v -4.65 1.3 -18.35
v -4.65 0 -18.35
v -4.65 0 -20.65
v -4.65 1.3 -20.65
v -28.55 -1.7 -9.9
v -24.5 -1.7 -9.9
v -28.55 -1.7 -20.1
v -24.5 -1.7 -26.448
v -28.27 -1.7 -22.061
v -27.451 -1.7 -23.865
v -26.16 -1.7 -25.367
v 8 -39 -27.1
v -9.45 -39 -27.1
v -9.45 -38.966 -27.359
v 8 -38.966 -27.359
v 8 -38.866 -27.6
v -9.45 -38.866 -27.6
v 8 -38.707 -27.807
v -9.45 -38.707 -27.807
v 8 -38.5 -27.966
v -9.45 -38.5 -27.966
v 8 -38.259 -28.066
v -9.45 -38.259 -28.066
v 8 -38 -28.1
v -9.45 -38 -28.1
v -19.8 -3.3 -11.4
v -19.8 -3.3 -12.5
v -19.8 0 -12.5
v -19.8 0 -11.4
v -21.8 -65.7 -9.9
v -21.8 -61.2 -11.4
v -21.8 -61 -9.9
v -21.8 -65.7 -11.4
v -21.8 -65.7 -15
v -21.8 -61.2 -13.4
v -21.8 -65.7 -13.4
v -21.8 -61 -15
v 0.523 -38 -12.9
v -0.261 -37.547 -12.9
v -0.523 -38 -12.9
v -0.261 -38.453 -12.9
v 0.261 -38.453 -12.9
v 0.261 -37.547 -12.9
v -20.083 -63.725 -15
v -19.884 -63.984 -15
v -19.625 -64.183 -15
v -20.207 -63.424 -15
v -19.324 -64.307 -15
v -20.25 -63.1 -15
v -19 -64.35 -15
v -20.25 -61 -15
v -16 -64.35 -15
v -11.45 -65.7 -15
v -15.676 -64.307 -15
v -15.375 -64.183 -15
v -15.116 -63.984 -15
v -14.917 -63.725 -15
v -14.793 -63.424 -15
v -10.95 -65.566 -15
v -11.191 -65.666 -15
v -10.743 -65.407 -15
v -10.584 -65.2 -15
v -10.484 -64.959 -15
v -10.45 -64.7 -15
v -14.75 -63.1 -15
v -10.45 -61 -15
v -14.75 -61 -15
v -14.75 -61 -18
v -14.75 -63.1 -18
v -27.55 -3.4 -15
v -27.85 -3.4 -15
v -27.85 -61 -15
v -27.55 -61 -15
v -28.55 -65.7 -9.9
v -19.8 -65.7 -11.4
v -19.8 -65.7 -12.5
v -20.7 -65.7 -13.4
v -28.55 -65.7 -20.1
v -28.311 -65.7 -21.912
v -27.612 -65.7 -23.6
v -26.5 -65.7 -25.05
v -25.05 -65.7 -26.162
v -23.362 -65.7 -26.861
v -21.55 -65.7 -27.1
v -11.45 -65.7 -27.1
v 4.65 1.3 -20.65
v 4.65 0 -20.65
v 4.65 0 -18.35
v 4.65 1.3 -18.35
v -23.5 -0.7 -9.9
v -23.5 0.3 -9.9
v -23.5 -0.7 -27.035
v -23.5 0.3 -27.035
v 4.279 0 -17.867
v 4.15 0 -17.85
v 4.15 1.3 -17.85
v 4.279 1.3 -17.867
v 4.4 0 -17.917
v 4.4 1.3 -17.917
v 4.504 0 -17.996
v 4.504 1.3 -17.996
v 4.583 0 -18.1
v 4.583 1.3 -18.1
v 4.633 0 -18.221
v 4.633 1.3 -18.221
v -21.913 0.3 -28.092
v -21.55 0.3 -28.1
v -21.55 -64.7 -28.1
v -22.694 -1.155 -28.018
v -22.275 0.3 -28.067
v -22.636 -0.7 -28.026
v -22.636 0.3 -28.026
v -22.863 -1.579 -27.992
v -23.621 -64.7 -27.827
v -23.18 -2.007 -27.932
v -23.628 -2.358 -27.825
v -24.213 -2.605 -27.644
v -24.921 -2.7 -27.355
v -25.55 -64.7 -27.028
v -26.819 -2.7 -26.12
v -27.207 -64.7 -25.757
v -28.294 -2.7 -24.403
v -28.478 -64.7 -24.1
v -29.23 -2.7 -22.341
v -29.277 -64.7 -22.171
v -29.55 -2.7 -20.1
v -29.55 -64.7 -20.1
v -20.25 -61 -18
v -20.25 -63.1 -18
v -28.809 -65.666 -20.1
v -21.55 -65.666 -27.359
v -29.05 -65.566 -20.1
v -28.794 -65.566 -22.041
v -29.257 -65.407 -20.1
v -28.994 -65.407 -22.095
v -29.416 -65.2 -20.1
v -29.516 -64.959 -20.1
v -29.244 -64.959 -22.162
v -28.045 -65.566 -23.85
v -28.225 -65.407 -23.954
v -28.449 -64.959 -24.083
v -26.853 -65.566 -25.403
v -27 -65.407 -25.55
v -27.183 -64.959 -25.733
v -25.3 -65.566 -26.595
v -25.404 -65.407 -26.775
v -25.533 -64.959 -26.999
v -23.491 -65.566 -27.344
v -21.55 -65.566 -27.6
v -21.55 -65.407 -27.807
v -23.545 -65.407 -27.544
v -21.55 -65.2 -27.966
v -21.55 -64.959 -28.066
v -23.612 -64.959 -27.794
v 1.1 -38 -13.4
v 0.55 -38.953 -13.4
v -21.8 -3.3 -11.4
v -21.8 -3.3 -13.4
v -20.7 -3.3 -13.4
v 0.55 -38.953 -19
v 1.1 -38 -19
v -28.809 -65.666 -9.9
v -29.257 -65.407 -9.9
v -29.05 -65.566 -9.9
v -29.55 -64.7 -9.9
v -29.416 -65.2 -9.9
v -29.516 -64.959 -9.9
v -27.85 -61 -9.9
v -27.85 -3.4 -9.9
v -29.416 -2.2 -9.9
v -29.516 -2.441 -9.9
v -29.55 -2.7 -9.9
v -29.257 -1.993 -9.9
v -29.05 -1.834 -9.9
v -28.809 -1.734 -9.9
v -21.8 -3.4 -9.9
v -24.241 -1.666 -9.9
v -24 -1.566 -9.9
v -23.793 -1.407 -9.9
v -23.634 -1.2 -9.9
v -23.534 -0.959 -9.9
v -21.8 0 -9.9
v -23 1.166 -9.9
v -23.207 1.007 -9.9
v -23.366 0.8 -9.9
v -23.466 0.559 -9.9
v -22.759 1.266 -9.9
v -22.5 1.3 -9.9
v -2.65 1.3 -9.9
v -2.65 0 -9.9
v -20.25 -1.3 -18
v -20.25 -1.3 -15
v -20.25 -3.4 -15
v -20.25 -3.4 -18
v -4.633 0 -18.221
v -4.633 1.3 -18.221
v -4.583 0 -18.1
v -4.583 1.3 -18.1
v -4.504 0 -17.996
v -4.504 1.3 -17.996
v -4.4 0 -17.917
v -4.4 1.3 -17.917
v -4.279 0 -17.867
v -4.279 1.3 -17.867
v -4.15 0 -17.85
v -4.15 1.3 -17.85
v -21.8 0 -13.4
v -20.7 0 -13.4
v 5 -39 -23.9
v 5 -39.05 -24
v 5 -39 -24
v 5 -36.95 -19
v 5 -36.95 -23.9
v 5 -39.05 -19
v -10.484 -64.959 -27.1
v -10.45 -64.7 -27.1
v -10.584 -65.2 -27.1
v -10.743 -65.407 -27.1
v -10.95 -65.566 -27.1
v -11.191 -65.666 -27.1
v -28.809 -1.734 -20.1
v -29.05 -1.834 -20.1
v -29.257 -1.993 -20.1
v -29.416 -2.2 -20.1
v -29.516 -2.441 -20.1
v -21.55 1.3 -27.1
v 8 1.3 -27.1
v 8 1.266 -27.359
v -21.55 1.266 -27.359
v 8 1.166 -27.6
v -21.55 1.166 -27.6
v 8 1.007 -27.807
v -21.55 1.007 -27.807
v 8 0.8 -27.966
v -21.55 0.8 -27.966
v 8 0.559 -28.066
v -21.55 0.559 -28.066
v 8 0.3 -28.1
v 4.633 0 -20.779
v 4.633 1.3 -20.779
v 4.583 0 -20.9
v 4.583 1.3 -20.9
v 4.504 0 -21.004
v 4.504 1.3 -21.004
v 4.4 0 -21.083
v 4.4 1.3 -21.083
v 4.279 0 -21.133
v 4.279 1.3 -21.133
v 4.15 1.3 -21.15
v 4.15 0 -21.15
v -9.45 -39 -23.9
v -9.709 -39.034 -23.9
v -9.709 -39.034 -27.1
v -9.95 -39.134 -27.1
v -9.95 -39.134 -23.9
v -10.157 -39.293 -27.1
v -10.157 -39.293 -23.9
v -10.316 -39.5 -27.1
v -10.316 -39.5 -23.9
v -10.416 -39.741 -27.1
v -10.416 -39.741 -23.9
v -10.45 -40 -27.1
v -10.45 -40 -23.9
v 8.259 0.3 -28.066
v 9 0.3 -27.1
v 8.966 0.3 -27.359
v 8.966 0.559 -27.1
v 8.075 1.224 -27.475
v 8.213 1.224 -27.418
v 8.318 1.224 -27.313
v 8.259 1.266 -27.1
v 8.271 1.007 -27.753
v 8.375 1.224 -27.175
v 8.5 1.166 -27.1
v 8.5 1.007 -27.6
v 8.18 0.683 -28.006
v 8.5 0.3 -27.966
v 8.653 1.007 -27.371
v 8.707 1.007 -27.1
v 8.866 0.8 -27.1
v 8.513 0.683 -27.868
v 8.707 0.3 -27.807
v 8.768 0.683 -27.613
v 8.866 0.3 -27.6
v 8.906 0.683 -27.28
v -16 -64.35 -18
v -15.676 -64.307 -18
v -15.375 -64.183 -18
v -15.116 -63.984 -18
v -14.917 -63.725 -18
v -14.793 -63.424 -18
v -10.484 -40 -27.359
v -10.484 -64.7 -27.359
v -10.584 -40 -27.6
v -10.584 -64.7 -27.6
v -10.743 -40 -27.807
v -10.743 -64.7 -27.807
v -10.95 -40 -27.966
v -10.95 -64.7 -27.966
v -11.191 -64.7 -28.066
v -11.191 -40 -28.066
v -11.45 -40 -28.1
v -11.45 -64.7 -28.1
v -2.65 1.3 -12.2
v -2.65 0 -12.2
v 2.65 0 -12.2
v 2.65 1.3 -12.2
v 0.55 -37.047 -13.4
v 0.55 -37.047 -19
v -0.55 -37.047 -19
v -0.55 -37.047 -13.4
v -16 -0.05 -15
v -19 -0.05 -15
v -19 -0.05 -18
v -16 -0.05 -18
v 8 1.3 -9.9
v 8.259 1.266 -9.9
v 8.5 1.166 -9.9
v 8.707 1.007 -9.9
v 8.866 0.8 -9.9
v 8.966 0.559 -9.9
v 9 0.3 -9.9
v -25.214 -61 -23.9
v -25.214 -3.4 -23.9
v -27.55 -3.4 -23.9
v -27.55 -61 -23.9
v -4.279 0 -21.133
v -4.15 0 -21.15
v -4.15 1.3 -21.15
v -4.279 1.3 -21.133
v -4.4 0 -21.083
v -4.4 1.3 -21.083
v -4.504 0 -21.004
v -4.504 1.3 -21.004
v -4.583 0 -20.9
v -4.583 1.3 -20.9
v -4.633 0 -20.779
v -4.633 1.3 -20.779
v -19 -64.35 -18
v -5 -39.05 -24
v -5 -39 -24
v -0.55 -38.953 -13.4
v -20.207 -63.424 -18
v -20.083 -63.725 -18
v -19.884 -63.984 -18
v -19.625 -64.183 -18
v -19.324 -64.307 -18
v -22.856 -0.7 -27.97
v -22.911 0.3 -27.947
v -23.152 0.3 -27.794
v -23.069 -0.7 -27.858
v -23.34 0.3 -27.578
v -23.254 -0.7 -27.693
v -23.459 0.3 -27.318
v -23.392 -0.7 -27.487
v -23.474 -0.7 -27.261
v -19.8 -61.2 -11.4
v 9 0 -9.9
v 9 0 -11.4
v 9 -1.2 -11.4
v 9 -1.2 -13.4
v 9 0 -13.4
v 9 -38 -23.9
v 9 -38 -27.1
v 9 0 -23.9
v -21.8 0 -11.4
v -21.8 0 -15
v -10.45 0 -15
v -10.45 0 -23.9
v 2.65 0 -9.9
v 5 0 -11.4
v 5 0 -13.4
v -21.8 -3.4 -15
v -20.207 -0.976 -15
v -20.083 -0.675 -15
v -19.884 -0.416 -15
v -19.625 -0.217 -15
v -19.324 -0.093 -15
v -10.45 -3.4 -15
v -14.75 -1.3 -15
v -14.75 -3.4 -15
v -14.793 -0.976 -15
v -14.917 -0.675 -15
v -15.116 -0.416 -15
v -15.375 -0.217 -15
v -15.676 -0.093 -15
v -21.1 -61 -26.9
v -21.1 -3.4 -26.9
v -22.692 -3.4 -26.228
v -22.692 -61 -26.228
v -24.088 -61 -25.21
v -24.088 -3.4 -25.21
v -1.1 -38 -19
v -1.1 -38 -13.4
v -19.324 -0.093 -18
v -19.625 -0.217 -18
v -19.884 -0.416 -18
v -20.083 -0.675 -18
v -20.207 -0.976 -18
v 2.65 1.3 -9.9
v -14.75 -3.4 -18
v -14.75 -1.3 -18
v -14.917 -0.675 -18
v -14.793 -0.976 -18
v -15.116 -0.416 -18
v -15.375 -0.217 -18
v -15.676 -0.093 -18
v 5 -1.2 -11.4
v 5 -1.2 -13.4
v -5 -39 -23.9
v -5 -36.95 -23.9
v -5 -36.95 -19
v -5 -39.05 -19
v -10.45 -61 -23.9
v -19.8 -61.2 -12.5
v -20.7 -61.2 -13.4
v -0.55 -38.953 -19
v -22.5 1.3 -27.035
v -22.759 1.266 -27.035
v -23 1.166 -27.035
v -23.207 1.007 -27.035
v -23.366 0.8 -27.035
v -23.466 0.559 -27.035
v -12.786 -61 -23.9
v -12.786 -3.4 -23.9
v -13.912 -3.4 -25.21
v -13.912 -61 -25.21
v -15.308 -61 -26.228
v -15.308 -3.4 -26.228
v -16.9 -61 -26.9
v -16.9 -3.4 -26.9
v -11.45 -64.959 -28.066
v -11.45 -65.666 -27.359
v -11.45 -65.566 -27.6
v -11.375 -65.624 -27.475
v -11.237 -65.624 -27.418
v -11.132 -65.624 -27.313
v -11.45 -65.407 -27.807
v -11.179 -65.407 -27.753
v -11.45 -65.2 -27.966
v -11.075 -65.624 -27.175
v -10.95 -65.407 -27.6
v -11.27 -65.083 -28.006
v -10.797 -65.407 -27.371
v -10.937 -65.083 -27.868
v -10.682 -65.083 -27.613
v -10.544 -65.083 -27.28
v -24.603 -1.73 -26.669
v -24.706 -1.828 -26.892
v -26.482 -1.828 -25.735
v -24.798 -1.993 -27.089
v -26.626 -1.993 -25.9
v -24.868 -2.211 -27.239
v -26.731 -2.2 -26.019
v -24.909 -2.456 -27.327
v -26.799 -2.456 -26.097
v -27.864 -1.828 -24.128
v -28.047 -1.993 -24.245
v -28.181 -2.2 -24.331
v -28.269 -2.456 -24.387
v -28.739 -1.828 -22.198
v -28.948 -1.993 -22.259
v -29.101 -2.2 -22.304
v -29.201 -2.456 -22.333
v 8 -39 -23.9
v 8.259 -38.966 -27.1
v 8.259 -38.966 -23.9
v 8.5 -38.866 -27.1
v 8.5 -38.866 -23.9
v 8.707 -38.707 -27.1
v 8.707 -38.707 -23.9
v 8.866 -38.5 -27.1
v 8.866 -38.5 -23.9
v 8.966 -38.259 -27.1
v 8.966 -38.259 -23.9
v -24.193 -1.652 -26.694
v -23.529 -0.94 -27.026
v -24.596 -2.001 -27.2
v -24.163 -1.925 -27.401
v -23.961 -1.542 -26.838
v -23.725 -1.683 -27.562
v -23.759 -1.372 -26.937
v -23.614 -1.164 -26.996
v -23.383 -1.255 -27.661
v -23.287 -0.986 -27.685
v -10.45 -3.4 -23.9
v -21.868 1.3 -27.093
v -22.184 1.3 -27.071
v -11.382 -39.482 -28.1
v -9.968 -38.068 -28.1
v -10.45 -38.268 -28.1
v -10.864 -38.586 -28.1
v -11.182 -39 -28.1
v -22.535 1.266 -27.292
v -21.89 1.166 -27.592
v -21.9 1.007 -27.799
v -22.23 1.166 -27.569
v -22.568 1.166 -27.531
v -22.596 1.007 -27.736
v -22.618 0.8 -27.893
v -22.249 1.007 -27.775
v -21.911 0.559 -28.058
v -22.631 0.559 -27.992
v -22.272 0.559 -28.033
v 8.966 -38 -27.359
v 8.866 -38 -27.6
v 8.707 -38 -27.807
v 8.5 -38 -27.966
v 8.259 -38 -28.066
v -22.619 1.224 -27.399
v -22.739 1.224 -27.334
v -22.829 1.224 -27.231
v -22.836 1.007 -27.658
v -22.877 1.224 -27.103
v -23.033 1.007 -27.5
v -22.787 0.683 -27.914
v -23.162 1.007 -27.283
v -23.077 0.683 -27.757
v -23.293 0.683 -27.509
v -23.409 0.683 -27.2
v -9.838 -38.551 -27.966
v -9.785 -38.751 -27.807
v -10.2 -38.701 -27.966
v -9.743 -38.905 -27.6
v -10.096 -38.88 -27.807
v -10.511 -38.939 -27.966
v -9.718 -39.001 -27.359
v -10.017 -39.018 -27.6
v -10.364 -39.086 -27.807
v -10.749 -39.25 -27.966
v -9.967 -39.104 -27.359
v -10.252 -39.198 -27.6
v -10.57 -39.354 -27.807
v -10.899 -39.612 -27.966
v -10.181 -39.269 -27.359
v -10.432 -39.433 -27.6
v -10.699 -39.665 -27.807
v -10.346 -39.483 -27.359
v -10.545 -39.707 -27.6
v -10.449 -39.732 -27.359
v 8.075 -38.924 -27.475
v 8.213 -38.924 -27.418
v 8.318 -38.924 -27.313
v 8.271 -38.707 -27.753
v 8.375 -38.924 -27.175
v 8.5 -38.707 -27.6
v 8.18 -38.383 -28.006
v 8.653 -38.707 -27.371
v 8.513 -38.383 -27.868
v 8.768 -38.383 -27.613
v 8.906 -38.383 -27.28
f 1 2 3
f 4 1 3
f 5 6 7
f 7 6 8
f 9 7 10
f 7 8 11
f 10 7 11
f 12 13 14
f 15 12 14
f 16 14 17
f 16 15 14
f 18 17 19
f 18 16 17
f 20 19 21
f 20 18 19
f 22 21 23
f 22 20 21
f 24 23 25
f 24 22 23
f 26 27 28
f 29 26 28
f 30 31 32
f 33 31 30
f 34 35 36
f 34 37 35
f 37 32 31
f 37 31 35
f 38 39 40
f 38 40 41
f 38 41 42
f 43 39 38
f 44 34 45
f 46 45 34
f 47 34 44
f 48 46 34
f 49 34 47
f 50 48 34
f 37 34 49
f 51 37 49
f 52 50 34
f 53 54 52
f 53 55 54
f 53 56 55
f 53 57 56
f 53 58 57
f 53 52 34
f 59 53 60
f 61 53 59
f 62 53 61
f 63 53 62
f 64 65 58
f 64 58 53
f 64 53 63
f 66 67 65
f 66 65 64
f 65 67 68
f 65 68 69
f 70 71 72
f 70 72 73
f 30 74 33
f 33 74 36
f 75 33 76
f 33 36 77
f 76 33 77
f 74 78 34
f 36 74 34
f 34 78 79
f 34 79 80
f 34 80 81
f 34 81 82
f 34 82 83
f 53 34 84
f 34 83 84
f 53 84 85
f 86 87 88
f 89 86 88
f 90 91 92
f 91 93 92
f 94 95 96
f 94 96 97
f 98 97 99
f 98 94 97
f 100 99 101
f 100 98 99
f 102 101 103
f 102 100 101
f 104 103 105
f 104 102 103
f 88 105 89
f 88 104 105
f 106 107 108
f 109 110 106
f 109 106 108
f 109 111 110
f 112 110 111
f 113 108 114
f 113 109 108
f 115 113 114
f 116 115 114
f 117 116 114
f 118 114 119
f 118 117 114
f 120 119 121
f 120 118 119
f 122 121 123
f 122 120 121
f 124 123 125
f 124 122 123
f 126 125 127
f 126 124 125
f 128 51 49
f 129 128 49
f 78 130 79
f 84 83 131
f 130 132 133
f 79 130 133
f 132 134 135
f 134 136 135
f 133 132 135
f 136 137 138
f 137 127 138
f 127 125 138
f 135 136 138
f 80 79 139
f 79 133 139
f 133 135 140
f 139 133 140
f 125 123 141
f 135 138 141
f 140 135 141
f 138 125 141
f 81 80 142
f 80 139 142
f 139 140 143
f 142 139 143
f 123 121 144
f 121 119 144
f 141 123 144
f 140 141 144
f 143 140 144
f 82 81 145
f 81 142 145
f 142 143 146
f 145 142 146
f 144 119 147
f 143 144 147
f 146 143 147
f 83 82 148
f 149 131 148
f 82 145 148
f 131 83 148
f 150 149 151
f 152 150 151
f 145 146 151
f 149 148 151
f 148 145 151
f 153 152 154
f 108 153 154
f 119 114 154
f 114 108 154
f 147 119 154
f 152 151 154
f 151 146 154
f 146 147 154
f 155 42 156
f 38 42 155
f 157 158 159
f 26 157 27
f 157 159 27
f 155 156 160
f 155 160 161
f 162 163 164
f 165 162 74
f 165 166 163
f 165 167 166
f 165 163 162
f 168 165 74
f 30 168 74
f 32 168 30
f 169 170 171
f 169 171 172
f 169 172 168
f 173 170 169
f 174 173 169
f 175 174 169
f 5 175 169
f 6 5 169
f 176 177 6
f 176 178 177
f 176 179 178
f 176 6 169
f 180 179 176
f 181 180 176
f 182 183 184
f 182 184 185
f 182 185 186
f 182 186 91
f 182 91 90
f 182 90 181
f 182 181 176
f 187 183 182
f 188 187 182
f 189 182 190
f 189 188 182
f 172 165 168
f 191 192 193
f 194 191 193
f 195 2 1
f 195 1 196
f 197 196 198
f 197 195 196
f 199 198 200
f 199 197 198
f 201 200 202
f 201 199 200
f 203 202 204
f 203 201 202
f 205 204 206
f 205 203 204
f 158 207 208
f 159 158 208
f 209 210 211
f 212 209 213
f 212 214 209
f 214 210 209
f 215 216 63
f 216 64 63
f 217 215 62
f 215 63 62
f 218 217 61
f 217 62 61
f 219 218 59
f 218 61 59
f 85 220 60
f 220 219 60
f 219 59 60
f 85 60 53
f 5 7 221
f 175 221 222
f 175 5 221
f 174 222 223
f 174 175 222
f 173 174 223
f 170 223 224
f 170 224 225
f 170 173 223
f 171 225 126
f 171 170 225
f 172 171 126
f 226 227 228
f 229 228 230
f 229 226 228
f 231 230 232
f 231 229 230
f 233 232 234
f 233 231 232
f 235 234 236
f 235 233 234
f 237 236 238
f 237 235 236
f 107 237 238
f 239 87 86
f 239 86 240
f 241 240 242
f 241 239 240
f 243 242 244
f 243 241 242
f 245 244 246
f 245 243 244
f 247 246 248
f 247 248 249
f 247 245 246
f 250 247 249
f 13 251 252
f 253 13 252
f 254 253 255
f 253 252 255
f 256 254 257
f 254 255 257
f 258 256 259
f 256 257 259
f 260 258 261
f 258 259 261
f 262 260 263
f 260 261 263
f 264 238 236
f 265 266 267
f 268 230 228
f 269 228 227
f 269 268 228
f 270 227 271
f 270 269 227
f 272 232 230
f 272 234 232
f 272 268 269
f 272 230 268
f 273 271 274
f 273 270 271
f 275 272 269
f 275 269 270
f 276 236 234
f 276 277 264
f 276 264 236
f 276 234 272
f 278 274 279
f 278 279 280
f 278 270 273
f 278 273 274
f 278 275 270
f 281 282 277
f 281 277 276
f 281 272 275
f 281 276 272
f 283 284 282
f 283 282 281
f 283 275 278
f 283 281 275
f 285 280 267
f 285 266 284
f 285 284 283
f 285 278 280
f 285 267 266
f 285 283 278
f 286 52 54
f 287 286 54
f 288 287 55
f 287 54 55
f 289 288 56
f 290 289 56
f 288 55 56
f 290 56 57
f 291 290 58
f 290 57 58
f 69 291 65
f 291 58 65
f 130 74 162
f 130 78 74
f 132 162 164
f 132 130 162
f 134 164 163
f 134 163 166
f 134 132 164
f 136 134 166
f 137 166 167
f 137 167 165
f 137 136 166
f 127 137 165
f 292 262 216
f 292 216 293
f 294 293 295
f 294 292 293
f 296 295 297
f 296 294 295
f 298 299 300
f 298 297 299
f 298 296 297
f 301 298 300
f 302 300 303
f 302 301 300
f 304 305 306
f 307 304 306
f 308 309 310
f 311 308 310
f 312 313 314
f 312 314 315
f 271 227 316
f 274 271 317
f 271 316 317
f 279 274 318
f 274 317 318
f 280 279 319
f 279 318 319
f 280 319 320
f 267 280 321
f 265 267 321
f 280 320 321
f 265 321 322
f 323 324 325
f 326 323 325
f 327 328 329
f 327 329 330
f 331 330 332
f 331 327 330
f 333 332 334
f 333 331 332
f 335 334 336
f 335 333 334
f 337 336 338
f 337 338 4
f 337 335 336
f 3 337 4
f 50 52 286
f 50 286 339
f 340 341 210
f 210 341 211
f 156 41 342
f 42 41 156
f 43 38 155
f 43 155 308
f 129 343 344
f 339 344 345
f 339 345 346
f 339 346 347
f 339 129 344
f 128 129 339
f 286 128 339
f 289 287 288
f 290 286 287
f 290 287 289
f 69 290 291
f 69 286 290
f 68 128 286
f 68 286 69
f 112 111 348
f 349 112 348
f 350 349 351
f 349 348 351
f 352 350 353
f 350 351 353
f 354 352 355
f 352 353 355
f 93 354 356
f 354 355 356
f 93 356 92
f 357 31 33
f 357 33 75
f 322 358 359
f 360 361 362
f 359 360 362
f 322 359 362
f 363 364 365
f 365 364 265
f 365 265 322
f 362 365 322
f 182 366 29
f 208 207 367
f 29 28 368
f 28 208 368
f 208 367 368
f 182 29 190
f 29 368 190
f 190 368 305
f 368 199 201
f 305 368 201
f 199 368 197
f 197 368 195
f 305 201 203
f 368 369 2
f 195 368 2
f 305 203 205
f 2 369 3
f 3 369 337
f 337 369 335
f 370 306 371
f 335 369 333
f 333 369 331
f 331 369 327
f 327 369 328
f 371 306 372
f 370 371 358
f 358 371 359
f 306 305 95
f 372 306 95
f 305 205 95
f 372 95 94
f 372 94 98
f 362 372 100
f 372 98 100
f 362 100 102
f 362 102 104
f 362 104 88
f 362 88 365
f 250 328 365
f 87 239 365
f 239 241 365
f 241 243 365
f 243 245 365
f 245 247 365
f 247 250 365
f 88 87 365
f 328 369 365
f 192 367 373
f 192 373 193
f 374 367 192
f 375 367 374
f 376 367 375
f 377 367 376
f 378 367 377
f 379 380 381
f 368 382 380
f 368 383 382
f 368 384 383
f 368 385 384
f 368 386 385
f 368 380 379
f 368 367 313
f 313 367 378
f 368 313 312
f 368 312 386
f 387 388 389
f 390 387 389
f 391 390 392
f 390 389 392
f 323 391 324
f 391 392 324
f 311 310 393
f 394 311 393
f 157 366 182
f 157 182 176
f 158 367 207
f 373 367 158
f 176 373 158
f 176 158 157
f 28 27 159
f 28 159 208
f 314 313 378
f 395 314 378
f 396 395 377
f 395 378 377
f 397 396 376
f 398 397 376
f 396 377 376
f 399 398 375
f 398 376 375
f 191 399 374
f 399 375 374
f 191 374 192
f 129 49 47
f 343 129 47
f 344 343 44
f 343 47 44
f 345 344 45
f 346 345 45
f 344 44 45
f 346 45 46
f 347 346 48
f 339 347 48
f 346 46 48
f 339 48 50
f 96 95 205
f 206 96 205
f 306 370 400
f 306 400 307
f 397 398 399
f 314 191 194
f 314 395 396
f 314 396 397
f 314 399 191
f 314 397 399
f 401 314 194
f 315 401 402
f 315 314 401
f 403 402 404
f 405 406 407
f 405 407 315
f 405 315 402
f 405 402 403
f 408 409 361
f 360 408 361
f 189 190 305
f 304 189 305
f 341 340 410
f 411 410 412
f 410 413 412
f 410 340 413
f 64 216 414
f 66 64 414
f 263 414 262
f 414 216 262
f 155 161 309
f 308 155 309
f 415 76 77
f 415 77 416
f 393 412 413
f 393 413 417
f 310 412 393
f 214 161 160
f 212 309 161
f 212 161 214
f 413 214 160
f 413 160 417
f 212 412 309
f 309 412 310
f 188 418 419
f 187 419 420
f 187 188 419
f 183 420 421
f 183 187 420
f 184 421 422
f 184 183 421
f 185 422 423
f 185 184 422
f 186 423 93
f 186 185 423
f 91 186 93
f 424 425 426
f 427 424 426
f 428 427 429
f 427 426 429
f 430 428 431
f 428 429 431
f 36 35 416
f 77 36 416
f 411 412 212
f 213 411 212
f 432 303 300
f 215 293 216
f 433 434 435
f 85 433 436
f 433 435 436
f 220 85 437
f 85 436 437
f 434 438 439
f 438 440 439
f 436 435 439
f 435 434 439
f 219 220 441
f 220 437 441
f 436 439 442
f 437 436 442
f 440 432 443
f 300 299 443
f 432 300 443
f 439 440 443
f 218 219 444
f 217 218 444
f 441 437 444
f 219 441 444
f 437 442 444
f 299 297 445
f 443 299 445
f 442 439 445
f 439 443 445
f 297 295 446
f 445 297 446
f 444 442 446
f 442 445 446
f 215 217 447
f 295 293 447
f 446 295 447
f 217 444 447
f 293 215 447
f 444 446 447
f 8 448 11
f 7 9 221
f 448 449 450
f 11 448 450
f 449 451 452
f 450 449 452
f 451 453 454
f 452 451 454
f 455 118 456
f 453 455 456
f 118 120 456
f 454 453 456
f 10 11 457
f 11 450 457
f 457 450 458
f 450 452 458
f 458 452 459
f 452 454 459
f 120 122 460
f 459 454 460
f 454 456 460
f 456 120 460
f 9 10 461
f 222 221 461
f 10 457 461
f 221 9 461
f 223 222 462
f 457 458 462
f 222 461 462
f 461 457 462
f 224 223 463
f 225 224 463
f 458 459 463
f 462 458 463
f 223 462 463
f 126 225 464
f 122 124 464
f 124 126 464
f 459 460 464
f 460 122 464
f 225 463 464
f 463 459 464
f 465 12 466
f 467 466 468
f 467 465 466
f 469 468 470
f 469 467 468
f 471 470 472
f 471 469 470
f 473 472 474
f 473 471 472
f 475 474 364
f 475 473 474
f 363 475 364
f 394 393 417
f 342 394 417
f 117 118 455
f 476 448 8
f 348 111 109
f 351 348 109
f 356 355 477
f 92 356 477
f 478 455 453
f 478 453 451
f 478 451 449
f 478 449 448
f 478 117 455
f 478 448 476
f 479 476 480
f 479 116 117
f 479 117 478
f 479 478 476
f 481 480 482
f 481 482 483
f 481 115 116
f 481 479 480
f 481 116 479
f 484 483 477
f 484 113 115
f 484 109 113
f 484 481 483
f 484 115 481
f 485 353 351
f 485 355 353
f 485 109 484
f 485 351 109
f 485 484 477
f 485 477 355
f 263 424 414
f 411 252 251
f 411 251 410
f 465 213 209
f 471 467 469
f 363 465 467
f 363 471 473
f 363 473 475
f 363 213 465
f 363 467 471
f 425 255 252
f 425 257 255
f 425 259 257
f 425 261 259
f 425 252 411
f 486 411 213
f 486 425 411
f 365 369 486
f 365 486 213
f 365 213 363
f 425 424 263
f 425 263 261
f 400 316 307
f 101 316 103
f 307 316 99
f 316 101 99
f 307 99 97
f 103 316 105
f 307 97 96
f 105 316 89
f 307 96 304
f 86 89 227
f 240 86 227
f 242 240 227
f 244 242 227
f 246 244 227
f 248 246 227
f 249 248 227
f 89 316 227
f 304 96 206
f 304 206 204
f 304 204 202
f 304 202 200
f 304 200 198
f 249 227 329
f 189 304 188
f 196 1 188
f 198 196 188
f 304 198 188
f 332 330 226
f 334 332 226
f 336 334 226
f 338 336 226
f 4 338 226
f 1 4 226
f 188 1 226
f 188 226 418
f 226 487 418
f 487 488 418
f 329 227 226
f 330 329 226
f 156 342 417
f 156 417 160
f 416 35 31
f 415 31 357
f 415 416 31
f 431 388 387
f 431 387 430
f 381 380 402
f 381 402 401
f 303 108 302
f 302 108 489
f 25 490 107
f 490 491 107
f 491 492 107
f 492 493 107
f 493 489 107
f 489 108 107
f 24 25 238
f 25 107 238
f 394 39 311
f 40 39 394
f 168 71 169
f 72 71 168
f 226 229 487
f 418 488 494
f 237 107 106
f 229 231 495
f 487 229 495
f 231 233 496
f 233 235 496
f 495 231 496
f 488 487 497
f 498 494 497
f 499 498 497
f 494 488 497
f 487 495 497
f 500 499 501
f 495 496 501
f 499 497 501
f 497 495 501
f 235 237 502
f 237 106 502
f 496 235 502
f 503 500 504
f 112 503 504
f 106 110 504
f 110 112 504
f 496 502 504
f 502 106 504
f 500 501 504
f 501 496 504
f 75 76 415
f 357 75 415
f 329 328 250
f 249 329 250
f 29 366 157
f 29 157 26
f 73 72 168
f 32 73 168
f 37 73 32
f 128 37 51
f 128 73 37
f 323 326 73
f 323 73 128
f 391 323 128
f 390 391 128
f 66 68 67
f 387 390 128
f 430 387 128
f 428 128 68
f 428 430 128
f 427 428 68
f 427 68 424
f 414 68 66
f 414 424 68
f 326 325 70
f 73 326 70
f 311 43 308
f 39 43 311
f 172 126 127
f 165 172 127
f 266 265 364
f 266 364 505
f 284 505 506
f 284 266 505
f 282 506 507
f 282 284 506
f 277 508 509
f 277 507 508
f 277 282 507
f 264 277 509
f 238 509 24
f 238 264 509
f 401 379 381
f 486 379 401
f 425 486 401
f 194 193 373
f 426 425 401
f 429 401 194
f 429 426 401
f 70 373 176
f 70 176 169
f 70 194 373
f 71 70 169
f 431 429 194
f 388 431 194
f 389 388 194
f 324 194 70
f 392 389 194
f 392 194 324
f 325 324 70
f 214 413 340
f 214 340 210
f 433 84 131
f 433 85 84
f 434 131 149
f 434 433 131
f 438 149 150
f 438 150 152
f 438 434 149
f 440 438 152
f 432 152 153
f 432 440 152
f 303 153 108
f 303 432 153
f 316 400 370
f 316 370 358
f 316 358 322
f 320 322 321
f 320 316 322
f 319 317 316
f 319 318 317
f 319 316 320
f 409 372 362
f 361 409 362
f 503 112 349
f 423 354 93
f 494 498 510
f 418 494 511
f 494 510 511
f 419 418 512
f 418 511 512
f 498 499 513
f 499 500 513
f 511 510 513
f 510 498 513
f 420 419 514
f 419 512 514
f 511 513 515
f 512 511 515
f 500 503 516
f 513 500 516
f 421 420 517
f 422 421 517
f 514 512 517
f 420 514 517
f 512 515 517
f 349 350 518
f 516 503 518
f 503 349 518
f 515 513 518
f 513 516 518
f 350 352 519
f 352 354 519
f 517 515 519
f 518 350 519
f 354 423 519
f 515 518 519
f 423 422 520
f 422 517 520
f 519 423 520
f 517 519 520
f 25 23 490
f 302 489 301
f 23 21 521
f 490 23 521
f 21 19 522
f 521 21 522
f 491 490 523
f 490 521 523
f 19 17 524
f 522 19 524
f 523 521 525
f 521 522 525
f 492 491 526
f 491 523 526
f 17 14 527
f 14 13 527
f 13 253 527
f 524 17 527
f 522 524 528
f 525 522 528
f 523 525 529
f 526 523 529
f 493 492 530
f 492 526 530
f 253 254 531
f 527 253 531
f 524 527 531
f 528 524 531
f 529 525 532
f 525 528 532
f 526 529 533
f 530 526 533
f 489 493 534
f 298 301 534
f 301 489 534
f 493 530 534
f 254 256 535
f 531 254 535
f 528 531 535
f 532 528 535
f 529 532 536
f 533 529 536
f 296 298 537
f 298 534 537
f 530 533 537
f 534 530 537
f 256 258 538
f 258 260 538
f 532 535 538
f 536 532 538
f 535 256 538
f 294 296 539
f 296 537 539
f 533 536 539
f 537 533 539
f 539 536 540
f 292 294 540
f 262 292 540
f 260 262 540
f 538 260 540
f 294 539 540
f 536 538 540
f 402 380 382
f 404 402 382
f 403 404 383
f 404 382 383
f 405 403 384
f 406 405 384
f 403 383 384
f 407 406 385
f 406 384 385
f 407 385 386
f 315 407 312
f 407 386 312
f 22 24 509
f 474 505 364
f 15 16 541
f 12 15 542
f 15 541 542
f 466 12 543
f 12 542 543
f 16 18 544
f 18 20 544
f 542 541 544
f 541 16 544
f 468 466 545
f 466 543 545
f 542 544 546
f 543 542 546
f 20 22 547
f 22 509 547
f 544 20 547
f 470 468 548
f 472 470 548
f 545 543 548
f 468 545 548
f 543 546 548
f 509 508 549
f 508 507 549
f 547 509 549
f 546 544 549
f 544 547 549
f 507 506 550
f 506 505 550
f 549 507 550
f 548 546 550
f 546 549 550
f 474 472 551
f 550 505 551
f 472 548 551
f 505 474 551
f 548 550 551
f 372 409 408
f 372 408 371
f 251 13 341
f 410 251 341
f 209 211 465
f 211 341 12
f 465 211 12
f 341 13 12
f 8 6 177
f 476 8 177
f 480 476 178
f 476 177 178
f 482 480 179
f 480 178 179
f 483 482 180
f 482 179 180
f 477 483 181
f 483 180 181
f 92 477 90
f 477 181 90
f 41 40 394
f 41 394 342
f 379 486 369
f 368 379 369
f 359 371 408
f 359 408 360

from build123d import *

# Parameters (mm, degrees)
PAD_DEPTH            = 18.2
SKETCH003_W          = 19.45
SKETCH003_H          = 39
POCKET_DEPTH         = 14.001
POCKET001_DEPTH      = 5.101
POCKET002_DEPTH      = 57.6
SKETCH011_W          = 5.3
SKETCH011_H          = 2.3
POCKET004_DEPTH      = 5
PAD005_DEPTH         = 10
PAD005_DEPTH_BACK    = 2.1
SKETCH014_W          = 10
SKETCH014_H          = 2.1
PAD006_DEPTH         = 5
CHAMFER001_SIZE      = 0.5
POCKET005_DEPTH      = 3
POCKET006_DEPTH      = 100
POCKET006_DEPTH_BACK = 100
FILLET001_R          = 1
SKETCH017_W          = 4
SKETCH017_H          = 1.2
SKETCH017_W_2        = 3.5
SKETCH017_H_2        = 4.5
SKETCH017_H_3        = 3.3
PAD008_DEPTH         = 2
CHAMFER_SIZE         = 0.9


with BuildPart() as body:
    # Sketch002 → Pad (new body)
    with BuildSketch(Plane.XY.offset(13.1)):
        Polygon((9, 0), (9, 1.3), (-23.5, 1.3), (-23.5, -1.7), (-29.55, -1.7), (-29.55, -65.7), (-10.45, -65.7), (-10.45, -39), (9, -39), align=None)
    extrude(amount=-PAD_DEPTH)

    # Sketch003 → Pocket (cut, through all)
    with BuildSketch(Plane.XY.offset(8.9)):
        with Locations((-0.725, -19.5)):
            Rectangle(SKETCH003_W, SKETCH003_H)
    extrude(amount=-POCKET_DEPTH, mode=Mode.SUBTRACT)

    # Sketch007 → Pocket001 (cut, through all)
    with BuildSketch(Plane.XY):
        Polygon((21.5, 0), (-21.8, 0), (-21.8, -3.4), (-27.85, -3.4), (-27.85, -61), (-21.8, -61), (-21.8, -68.9), (21.5, -68.9), align=None)
    extrude(amount=-POCKET001_DEPTH, mode=Mode.SUBTRACT)

    # Sketch008 → Pocket002 (cut)
    with BuildSketch(Plane.XZ.offset(3.4)):
        with BuildLine():
            ThreePointArc((-12.786305, 8.9), (-14.580794, 10.759754), (-16.9, 11.9))
            Line((-21.1, 11.9), (-16.9, 11.9))
            ThreePointArc((-21.1, 11.9), (-23.419206, 10.759754), (-25.213695, 8.9))
            Line((-25.213695, 8.9), (-27.55, 8.9))
            Line((-27.55, 8.9), (-27.55, -3.6))
            Line((-27.55, -3.6), (-10.45, -3.6))
            Line((-10.45, 8.9), (-10.45, -3.6))
            Line((-12.786305, 8.9), (-10.45, 8.9))
        make_face()
    extrude(amount=POCKET002_DEPTH, mode=Mode.SUBTRACT)

    # Sketch011 → Pocket004 (cut)
    with BuildSketch(Plane.XZ):
        with Locations((0, -3.95)):
            Rectangle(SKETCH011_W, SKETCH011_H)
        with BuildLine():
            Line((-4.65, 3.35), (-4.65, 5.65))
            ThreePointArc((-4.15, 6.15), (-4.503553, 6.003553), (-4.65, 5.65))
            Line((-4.15, 6.15), (4.15, 6.15))
            ThreePointArc((4.65, 5.65), (4.503553, 6.003553), (4.15, 6.15))
            Line((4.65, 5.65), (4.65, 3.35))
            ThreePointArc((4.15, 2.85), (4.503553, 2.996447), (4.65, 3.35))
            Line((4.15, 2.85), (-4.15, 2.85))
            ThreePointArc((-4.65, 3.35), (-4.503553, 2.996447), (-4.15, 2.85))
        make_face()
    extrude(amount=-POCKET004_DEPTH, mode=Mode.SUBTRACT)

    # Sketch012 → Pad005 (join, two sides)
    with BuildSketch(Plane.XY) as pad005_sk:
        Polygon((1.1, -38), (0.55, -37.047372), (-0.55, -37.047372), (-1.1, -38), (-0.55, -38.952628), (0.55, -38.952628), align=None)
    extrude(amount=PAD005_DEPTH)
    extrude(pad005_sk.sketch, amount=-PAD005_DEPTH_BACK)

    # Sketch014 → Pad006 (join)
    with BuildSketch(Plane.XY.offset(4)):
        with Locations((0, -38)):
            Rectangle(SKETCH014_W, SKETCH014_H)
    extrude(amount=PAD006_DEPTH)

    # Chamfer001
    chamfer001_edges = [body.edges().sort_by_distance(p)[0] for p in [
        (0.825, -37.523686, -2.1),
        (0, -37.047372, -2.1),
        (-0.825, -37.523686, -2.1),
        (-0.825, -38.476314, -2.1),
        (0, -38.952628, -2.1),
        (0.825, -38.476314, -2.1),
    ]]
    chamfer(chamfer001_edges, length=CHAMFER001_SIZE)

    # Sketch013 → Pocket005 (cut)
    with BuildSketch(Plane.XY):
        with BuildLine():
            Line((-20.25, -62.3), (-20.25, -63.1))
            ThreePointArc((-20.25, -63.1), (-19.883883, -63.983883), (-19, -64.35))
            Line((-16, -64.35), (-19, -64.35))
            ThreePointArc((-16, -64.35), (-15.116117, -63.983883), (-14.75, -63.1))
            Line((-14.75, -1.3), (-14.75, -63.1))
            ThreePointArc((-14.75, -1.3), (-15.116117, -0.416117), (-16, -0.05))
            Line((-19, -0.05), (-16, -0.05))
            ThreePointArc((-19, -0.05), (-19.883883, -0.416117), (-20.25, -1.3))
            Line((-20.25, -1.3), (-20.25, -2.1))
            Line((-20.25, -2.1), (-20.25, -62.3))
        make_face()
    extrude(amount=POCKET005_DEPTH, mode=Mode.SUBTRACT)

    # Sketch016 → Pocket006 (cut, two sides)
    with BuildSketch(Plane.XZ) as pocket006_sk:
        with BuildLine():
            ThreePointArc((-21.55, 13.1), (-27.206854, 10.756854), (-29.55, 5.1))
            Line((-29.55, 5.1), (-32.473244, 5.1))
            Line((-32.473244, 5.1), (-32.473244, 16.532589))
            Line((-32.473244, 16.532589), (-21.55, 16.532589))
            Line((-21.55, 16.532589), (-21.55, 13.1))
        make_face()
    extrude(amount=POCKET006_DEPTH, mode=Mode.SUBTRACT)
    extrude(pocket006_sk.sketch, amount=-POCKET006_DEPTH_BACK, mode=Mode.SUBTRACT)

    # Fillet001
    fillet001_edges = [body.edges().sort_by_distance(p)[0] for p in [
        (9, -19.5, 13.1),
        (-0.725, -39, 13.1),
        (-10.45, -52.35, 13.1),
        (-16, -65.7, 13.1),
        (-21.55, -32.2, 13.1),
        (-6.275, 1.3, 13.1),
        (9, 0.65, 13.1),
        (-22.532436, 1.3, 13.039447),
        (-23.5, 1.3, 3.879352),
        (-23.5, -0.2, 12.858705),
        (-23.5, -1.7, 3.879352),
        (-29.55, -1.7, 0),
        (-27.858724, -1.7, 10.01935),
        (-29.55, -65.7, 0),
        (-27.206854, -65.7, 10.756854),
        (-10.45, -65.7, 6.55),
        (-10.45, -39, 11),
        (9, -39, 11),
        (9, 1.3, 4),
    ]]
    fillet(fillet001_edges, radius=FILLET001_R)

    # Sketch017 → Pad008 (join)
    with BuildSketch(Plane.XY.offset(-1.6)):
        with Locations((7, -0.6)):
            Rectangle(SKETCH017_W, SKETCH017_H)
        with Locations((-21.55, -63.45)):
            Rectangle(SKETCH017_W_2, SKETCH017_H_2)
        with Locations((-21.55, -1.65)):
            Rectangle(SKETCH017_W_2, SKETCH017_H_3)
    extrude(amount=-PAD008_DEPTH)

    # Chamfer
    chamfer_edges = [body.edges().sort_by_distance(p)[0] for p in [
        (-19.8, -1.65, -1.6),
        (-19.8, -63.45, -1.6),
    ]]
    chamfer(chamfer_edges, length=CHAMFER_SIZE)


with BuildPart() as part_mirroring:
    # Part__Mirroring: instance of Body
    add(body.part.mirror(Plane(origin=(-10.604568, -32.200001, 0), x_dir=(0, 1, 0), z_dir=(0, 0, 1))))


with BuildPart() as part_mirroring_1:
    # Part__Mirroring placement: moved
    add(part_mirroring.part.moved(Location((0, 0, -15))))


solid = part_mirroring_1.part
